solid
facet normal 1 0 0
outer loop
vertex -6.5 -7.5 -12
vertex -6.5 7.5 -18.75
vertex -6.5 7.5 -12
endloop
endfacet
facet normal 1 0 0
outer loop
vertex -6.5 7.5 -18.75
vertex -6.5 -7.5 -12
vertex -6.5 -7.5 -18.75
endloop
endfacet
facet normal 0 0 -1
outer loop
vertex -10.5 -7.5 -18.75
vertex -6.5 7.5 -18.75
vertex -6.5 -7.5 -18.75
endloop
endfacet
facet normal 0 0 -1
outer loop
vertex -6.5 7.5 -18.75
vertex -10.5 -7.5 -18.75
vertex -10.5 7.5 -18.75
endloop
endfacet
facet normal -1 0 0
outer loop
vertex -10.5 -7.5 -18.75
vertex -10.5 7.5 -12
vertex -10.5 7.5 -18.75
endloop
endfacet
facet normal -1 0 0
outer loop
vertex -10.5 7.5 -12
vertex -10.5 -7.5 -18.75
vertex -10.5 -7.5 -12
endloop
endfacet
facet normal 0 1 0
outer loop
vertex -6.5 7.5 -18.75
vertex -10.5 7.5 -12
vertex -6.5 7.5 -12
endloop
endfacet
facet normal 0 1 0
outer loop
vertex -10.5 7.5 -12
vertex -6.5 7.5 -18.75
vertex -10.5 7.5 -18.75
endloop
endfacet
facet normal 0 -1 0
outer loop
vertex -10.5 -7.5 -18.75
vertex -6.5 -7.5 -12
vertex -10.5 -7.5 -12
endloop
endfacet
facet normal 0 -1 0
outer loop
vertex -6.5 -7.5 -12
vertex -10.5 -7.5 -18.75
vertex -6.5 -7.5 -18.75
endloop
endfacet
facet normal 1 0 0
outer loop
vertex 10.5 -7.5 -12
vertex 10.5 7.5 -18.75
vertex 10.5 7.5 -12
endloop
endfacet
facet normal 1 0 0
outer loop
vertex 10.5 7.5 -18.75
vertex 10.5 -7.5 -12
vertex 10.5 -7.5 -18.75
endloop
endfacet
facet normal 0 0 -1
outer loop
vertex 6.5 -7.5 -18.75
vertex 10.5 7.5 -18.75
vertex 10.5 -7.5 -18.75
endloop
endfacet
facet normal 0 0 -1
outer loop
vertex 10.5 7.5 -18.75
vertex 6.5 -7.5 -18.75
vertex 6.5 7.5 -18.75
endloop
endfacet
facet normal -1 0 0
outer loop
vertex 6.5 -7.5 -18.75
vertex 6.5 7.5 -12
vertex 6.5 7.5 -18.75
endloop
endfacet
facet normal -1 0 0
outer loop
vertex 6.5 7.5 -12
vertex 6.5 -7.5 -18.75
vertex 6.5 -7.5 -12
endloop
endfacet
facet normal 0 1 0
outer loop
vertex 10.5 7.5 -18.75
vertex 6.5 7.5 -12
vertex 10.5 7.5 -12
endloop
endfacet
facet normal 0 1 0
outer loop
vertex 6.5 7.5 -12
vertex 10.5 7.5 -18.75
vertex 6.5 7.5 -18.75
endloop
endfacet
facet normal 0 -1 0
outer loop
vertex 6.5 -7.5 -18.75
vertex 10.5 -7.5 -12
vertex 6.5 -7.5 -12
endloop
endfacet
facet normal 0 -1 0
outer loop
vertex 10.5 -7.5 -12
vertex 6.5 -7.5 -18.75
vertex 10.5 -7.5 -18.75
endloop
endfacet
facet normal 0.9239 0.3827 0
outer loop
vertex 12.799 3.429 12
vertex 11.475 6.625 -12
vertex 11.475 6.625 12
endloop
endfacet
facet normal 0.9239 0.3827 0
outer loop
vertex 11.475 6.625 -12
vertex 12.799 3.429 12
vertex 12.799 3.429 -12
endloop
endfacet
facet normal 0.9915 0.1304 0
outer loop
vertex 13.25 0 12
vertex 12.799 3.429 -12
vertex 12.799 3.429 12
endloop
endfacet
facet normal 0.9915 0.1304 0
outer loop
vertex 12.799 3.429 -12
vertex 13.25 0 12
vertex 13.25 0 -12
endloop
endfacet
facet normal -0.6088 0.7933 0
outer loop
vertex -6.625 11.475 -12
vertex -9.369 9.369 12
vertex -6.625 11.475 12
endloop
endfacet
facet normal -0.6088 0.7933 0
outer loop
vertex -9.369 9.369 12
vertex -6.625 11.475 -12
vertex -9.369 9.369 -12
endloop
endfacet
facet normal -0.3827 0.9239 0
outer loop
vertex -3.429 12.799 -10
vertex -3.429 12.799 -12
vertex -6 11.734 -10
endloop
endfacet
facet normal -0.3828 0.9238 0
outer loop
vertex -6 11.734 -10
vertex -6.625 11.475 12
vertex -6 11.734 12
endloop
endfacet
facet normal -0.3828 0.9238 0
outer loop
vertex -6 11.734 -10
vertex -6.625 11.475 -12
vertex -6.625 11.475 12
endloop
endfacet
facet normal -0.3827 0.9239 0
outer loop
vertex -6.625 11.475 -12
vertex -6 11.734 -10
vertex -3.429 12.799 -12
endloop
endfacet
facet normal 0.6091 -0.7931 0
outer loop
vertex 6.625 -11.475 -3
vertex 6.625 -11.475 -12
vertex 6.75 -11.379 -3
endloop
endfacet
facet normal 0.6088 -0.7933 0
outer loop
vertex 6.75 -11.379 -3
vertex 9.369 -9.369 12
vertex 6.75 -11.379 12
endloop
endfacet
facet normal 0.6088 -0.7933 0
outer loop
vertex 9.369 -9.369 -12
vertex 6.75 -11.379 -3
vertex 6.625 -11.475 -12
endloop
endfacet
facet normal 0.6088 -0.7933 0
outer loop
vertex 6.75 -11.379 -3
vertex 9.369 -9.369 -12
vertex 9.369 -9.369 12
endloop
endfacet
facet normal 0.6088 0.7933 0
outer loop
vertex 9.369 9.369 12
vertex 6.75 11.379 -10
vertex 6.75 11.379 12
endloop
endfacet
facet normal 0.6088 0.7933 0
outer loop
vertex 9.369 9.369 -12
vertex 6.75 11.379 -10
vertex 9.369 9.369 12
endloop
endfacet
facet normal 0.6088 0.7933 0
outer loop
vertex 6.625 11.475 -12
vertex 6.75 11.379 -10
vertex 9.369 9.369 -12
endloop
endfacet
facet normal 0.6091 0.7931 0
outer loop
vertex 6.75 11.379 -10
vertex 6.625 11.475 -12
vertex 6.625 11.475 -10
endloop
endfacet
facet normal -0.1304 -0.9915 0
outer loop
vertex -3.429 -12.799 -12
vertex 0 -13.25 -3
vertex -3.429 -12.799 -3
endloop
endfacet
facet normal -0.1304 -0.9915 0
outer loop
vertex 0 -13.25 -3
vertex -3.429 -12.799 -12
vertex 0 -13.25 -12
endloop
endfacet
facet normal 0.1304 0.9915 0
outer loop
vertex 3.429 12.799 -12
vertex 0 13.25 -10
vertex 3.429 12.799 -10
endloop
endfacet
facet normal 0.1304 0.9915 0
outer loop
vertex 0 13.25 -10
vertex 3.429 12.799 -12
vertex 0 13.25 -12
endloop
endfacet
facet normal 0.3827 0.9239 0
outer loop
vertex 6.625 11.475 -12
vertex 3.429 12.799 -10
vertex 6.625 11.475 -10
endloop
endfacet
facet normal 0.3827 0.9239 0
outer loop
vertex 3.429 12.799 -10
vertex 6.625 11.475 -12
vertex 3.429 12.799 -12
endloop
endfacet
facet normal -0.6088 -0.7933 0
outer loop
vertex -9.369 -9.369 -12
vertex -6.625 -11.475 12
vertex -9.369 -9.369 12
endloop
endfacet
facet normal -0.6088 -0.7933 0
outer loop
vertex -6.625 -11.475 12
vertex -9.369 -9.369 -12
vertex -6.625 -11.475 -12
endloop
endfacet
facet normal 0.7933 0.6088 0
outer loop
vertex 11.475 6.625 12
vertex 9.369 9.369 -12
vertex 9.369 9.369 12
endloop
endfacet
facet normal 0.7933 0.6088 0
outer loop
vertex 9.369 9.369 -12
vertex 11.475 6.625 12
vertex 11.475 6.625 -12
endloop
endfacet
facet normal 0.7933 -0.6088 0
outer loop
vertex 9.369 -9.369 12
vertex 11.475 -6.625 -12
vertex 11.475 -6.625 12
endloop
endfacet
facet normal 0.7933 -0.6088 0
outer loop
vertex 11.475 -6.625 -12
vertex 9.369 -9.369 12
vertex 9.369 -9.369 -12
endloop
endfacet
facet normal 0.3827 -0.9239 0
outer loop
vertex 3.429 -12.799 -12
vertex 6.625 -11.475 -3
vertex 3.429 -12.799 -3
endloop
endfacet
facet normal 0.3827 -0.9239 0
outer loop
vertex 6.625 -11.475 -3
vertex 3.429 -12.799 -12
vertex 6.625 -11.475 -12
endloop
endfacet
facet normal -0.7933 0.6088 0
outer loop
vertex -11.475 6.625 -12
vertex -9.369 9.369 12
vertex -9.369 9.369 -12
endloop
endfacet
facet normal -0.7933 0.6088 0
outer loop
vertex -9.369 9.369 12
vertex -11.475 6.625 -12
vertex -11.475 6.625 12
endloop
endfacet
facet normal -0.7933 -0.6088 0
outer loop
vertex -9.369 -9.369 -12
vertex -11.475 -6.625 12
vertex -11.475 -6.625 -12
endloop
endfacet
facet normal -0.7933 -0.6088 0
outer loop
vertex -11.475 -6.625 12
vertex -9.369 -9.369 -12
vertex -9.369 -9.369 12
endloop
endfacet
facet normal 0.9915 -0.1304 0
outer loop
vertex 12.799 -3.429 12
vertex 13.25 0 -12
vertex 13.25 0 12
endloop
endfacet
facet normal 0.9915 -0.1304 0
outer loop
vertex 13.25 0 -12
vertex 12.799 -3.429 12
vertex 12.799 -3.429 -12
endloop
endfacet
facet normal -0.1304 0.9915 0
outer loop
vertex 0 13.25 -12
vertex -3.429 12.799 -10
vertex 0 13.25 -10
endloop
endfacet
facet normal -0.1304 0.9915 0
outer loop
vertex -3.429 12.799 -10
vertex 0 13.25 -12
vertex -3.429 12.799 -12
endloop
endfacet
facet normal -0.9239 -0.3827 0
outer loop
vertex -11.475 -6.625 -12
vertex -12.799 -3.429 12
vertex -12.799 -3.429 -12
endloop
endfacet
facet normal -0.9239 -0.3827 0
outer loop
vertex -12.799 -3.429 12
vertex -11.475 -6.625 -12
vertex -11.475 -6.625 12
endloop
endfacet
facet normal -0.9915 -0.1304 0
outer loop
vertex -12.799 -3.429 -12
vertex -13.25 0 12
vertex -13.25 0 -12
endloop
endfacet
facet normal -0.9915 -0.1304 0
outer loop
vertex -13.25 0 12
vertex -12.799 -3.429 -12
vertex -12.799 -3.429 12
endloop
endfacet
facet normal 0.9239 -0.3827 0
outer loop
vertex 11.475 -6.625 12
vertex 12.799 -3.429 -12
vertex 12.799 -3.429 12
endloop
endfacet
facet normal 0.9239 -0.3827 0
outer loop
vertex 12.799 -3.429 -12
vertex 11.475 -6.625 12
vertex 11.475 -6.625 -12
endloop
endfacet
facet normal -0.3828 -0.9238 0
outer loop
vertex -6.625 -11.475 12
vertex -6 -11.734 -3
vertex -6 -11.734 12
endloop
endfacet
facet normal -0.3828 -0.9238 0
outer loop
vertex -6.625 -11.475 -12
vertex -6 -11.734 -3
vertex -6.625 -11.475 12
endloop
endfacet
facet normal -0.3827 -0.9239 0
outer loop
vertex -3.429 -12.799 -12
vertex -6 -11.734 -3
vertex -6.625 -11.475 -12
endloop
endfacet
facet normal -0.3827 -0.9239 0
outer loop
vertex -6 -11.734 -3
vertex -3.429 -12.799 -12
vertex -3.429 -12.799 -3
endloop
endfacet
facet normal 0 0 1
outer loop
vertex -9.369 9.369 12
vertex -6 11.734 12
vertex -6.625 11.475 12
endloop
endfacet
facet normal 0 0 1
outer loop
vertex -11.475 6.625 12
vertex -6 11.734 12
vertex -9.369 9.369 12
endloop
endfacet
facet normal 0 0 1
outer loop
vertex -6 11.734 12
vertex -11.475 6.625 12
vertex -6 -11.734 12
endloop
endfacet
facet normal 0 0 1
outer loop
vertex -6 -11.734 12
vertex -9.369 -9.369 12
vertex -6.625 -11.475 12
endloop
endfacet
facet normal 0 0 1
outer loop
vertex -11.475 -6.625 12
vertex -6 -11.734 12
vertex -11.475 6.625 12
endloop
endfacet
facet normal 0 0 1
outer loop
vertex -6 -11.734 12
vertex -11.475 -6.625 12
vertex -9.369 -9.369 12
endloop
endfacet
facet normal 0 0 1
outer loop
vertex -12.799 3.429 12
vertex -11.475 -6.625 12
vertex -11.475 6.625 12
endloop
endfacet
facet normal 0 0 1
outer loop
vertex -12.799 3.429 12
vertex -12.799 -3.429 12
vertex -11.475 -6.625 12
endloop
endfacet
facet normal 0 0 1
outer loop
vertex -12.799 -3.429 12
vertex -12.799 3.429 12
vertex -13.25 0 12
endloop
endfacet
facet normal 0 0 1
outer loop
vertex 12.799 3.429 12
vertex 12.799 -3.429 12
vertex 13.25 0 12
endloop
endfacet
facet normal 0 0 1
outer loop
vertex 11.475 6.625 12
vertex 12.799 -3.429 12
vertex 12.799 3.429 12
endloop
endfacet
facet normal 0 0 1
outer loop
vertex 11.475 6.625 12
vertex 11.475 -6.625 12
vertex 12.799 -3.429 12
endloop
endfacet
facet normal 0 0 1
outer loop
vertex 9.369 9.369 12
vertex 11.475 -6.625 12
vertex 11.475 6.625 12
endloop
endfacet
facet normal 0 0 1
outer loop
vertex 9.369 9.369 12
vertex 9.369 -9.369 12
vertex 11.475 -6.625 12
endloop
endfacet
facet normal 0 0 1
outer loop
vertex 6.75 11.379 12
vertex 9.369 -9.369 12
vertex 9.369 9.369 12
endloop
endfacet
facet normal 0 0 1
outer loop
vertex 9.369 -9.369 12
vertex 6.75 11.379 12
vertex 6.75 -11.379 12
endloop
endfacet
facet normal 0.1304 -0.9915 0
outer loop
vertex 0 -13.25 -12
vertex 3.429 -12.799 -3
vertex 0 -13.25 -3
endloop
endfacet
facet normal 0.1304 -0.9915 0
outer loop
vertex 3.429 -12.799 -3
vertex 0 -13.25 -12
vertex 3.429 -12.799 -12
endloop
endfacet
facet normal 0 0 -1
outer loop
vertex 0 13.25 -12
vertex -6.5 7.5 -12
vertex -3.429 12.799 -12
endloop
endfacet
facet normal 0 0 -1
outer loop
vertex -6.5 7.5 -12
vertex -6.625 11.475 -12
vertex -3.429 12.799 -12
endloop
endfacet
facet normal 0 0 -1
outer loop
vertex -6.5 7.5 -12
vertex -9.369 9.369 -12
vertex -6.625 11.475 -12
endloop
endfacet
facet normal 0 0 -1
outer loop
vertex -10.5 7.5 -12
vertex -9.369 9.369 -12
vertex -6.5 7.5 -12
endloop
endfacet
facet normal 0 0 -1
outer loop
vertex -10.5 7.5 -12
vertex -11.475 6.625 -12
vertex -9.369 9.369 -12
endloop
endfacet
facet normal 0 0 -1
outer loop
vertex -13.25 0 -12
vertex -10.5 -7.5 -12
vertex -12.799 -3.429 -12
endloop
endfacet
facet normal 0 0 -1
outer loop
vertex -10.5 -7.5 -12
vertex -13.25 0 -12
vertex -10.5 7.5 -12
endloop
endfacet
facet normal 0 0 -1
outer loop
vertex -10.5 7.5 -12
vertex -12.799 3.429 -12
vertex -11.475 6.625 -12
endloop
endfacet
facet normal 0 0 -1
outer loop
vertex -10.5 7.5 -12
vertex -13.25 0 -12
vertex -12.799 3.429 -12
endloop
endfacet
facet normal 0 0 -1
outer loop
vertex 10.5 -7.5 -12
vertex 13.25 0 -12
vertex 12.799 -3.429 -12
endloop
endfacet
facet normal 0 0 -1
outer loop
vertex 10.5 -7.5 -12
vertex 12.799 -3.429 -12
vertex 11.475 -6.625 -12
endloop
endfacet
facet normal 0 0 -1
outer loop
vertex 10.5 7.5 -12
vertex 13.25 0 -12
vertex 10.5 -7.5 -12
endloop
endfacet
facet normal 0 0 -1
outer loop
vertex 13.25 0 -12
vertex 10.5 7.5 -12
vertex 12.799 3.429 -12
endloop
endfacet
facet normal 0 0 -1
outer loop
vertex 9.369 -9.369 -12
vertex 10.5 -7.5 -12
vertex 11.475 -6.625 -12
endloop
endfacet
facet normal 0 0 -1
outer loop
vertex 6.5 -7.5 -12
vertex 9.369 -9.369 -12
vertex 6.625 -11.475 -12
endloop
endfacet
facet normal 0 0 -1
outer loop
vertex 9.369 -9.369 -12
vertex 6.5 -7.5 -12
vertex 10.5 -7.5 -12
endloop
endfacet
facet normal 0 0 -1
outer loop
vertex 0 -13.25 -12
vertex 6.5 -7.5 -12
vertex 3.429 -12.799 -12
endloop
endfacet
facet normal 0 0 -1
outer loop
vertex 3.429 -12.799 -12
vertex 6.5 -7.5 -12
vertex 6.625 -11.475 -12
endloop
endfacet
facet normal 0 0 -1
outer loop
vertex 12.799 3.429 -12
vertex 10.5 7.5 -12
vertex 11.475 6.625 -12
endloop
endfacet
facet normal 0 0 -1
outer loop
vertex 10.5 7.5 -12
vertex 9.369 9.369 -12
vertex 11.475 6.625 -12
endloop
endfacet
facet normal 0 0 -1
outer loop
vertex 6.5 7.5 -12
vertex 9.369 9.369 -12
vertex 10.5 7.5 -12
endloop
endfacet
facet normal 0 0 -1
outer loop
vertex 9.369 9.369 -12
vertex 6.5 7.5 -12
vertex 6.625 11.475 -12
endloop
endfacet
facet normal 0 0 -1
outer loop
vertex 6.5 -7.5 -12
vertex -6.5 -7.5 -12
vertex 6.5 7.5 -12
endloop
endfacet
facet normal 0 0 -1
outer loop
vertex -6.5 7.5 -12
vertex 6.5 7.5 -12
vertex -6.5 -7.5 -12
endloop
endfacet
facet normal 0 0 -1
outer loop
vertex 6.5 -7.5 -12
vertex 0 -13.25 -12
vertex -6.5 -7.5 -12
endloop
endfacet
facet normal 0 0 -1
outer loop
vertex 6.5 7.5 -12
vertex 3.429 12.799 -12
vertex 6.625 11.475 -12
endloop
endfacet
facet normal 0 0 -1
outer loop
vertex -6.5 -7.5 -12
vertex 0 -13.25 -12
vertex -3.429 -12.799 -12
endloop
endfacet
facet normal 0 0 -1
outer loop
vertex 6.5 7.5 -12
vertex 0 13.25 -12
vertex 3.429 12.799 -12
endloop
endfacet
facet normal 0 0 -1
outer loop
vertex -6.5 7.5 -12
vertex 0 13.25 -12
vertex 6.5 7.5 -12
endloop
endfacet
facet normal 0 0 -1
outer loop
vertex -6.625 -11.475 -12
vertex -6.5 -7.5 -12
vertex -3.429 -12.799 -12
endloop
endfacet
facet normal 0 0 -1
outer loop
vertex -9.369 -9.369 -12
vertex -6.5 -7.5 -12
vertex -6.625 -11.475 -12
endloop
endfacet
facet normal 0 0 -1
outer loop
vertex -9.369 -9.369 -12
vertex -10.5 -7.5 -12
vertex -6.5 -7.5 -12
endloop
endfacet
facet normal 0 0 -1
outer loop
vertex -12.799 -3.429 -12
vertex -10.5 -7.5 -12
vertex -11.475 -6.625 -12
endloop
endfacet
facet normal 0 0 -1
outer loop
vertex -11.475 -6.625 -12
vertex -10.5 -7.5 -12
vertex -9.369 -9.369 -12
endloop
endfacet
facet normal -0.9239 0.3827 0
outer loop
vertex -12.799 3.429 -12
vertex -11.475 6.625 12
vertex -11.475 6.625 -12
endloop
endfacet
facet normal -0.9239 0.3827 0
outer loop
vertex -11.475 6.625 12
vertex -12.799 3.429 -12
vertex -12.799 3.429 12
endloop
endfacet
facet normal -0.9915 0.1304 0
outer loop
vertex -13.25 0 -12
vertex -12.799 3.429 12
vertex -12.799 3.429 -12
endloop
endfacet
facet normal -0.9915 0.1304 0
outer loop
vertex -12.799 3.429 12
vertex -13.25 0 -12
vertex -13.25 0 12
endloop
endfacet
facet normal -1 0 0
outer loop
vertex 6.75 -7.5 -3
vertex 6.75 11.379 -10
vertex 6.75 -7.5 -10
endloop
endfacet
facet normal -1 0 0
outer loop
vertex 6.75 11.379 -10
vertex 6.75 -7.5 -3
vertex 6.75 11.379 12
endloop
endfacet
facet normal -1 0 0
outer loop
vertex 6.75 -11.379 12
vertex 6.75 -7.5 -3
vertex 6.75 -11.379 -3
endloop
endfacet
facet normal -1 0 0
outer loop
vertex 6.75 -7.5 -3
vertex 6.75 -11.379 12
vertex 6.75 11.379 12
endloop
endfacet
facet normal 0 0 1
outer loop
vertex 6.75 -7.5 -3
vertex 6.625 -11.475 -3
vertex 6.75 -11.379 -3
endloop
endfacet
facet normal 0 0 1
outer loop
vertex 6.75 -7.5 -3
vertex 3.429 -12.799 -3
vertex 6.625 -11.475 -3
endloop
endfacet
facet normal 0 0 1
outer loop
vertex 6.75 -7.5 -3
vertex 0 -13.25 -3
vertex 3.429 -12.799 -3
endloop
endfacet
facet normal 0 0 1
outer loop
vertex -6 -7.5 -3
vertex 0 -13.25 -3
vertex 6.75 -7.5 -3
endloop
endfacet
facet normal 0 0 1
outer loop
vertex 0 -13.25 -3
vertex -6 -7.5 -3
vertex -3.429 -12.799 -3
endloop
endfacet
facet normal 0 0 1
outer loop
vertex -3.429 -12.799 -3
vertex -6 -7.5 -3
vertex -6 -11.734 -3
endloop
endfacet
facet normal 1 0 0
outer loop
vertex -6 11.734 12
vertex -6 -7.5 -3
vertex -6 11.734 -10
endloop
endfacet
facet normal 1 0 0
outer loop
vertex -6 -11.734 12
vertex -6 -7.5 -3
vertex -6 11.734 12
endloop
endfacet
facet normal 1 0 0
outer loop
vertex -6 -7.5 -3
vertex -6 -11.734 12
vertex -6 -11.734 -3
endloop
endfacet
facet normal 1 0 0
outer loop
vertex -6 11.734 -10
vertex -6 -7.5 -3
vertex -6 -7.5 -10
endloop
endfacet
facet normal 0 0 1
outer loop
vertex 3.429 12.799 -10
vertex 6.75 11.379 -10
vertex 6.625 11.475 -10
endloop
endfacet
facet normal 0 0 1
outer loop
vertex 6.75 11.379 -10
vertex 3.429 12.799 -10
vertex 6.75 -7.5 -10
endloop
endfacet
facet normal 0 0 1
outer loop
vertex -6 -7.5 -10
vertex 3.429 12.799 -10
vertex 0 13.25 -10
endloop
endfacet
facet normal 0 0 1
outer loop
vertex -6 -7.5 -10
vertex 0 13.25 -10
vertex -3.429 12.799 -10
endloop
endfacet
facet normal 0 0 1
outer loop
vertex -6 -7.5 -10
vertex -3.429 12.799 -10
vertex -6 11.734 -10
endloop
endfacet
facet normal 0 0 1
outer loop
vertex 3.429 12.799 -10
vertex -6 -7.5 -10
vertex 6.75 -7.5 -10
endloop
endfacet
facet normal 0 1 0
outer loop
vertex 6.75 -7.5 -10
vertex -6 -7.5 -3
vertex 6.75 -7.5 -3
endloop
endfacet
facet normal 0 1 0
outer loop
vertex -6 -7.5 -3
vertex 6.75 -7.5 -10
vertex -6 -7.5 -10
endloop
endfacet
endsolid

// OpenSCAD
xbot_motor_mount();

module xbot_motor_mount() {
	difference() {
		union() {
			// body
			cylinder(r = 13.25, h = 24, center = true, $fn=24);
			// feet
			for (i = [-8.5, 8.5]) {
				translate([i, 0, -14]) cube([4, 15, 9.5], center=true);
			}
		}
		translate([-6, -20, -3]) cube([12.75, 40, 50], center=false);
		translate([-6, -7.5, -10]) cube([12.75, 30, 50], center=false);
	}
}
